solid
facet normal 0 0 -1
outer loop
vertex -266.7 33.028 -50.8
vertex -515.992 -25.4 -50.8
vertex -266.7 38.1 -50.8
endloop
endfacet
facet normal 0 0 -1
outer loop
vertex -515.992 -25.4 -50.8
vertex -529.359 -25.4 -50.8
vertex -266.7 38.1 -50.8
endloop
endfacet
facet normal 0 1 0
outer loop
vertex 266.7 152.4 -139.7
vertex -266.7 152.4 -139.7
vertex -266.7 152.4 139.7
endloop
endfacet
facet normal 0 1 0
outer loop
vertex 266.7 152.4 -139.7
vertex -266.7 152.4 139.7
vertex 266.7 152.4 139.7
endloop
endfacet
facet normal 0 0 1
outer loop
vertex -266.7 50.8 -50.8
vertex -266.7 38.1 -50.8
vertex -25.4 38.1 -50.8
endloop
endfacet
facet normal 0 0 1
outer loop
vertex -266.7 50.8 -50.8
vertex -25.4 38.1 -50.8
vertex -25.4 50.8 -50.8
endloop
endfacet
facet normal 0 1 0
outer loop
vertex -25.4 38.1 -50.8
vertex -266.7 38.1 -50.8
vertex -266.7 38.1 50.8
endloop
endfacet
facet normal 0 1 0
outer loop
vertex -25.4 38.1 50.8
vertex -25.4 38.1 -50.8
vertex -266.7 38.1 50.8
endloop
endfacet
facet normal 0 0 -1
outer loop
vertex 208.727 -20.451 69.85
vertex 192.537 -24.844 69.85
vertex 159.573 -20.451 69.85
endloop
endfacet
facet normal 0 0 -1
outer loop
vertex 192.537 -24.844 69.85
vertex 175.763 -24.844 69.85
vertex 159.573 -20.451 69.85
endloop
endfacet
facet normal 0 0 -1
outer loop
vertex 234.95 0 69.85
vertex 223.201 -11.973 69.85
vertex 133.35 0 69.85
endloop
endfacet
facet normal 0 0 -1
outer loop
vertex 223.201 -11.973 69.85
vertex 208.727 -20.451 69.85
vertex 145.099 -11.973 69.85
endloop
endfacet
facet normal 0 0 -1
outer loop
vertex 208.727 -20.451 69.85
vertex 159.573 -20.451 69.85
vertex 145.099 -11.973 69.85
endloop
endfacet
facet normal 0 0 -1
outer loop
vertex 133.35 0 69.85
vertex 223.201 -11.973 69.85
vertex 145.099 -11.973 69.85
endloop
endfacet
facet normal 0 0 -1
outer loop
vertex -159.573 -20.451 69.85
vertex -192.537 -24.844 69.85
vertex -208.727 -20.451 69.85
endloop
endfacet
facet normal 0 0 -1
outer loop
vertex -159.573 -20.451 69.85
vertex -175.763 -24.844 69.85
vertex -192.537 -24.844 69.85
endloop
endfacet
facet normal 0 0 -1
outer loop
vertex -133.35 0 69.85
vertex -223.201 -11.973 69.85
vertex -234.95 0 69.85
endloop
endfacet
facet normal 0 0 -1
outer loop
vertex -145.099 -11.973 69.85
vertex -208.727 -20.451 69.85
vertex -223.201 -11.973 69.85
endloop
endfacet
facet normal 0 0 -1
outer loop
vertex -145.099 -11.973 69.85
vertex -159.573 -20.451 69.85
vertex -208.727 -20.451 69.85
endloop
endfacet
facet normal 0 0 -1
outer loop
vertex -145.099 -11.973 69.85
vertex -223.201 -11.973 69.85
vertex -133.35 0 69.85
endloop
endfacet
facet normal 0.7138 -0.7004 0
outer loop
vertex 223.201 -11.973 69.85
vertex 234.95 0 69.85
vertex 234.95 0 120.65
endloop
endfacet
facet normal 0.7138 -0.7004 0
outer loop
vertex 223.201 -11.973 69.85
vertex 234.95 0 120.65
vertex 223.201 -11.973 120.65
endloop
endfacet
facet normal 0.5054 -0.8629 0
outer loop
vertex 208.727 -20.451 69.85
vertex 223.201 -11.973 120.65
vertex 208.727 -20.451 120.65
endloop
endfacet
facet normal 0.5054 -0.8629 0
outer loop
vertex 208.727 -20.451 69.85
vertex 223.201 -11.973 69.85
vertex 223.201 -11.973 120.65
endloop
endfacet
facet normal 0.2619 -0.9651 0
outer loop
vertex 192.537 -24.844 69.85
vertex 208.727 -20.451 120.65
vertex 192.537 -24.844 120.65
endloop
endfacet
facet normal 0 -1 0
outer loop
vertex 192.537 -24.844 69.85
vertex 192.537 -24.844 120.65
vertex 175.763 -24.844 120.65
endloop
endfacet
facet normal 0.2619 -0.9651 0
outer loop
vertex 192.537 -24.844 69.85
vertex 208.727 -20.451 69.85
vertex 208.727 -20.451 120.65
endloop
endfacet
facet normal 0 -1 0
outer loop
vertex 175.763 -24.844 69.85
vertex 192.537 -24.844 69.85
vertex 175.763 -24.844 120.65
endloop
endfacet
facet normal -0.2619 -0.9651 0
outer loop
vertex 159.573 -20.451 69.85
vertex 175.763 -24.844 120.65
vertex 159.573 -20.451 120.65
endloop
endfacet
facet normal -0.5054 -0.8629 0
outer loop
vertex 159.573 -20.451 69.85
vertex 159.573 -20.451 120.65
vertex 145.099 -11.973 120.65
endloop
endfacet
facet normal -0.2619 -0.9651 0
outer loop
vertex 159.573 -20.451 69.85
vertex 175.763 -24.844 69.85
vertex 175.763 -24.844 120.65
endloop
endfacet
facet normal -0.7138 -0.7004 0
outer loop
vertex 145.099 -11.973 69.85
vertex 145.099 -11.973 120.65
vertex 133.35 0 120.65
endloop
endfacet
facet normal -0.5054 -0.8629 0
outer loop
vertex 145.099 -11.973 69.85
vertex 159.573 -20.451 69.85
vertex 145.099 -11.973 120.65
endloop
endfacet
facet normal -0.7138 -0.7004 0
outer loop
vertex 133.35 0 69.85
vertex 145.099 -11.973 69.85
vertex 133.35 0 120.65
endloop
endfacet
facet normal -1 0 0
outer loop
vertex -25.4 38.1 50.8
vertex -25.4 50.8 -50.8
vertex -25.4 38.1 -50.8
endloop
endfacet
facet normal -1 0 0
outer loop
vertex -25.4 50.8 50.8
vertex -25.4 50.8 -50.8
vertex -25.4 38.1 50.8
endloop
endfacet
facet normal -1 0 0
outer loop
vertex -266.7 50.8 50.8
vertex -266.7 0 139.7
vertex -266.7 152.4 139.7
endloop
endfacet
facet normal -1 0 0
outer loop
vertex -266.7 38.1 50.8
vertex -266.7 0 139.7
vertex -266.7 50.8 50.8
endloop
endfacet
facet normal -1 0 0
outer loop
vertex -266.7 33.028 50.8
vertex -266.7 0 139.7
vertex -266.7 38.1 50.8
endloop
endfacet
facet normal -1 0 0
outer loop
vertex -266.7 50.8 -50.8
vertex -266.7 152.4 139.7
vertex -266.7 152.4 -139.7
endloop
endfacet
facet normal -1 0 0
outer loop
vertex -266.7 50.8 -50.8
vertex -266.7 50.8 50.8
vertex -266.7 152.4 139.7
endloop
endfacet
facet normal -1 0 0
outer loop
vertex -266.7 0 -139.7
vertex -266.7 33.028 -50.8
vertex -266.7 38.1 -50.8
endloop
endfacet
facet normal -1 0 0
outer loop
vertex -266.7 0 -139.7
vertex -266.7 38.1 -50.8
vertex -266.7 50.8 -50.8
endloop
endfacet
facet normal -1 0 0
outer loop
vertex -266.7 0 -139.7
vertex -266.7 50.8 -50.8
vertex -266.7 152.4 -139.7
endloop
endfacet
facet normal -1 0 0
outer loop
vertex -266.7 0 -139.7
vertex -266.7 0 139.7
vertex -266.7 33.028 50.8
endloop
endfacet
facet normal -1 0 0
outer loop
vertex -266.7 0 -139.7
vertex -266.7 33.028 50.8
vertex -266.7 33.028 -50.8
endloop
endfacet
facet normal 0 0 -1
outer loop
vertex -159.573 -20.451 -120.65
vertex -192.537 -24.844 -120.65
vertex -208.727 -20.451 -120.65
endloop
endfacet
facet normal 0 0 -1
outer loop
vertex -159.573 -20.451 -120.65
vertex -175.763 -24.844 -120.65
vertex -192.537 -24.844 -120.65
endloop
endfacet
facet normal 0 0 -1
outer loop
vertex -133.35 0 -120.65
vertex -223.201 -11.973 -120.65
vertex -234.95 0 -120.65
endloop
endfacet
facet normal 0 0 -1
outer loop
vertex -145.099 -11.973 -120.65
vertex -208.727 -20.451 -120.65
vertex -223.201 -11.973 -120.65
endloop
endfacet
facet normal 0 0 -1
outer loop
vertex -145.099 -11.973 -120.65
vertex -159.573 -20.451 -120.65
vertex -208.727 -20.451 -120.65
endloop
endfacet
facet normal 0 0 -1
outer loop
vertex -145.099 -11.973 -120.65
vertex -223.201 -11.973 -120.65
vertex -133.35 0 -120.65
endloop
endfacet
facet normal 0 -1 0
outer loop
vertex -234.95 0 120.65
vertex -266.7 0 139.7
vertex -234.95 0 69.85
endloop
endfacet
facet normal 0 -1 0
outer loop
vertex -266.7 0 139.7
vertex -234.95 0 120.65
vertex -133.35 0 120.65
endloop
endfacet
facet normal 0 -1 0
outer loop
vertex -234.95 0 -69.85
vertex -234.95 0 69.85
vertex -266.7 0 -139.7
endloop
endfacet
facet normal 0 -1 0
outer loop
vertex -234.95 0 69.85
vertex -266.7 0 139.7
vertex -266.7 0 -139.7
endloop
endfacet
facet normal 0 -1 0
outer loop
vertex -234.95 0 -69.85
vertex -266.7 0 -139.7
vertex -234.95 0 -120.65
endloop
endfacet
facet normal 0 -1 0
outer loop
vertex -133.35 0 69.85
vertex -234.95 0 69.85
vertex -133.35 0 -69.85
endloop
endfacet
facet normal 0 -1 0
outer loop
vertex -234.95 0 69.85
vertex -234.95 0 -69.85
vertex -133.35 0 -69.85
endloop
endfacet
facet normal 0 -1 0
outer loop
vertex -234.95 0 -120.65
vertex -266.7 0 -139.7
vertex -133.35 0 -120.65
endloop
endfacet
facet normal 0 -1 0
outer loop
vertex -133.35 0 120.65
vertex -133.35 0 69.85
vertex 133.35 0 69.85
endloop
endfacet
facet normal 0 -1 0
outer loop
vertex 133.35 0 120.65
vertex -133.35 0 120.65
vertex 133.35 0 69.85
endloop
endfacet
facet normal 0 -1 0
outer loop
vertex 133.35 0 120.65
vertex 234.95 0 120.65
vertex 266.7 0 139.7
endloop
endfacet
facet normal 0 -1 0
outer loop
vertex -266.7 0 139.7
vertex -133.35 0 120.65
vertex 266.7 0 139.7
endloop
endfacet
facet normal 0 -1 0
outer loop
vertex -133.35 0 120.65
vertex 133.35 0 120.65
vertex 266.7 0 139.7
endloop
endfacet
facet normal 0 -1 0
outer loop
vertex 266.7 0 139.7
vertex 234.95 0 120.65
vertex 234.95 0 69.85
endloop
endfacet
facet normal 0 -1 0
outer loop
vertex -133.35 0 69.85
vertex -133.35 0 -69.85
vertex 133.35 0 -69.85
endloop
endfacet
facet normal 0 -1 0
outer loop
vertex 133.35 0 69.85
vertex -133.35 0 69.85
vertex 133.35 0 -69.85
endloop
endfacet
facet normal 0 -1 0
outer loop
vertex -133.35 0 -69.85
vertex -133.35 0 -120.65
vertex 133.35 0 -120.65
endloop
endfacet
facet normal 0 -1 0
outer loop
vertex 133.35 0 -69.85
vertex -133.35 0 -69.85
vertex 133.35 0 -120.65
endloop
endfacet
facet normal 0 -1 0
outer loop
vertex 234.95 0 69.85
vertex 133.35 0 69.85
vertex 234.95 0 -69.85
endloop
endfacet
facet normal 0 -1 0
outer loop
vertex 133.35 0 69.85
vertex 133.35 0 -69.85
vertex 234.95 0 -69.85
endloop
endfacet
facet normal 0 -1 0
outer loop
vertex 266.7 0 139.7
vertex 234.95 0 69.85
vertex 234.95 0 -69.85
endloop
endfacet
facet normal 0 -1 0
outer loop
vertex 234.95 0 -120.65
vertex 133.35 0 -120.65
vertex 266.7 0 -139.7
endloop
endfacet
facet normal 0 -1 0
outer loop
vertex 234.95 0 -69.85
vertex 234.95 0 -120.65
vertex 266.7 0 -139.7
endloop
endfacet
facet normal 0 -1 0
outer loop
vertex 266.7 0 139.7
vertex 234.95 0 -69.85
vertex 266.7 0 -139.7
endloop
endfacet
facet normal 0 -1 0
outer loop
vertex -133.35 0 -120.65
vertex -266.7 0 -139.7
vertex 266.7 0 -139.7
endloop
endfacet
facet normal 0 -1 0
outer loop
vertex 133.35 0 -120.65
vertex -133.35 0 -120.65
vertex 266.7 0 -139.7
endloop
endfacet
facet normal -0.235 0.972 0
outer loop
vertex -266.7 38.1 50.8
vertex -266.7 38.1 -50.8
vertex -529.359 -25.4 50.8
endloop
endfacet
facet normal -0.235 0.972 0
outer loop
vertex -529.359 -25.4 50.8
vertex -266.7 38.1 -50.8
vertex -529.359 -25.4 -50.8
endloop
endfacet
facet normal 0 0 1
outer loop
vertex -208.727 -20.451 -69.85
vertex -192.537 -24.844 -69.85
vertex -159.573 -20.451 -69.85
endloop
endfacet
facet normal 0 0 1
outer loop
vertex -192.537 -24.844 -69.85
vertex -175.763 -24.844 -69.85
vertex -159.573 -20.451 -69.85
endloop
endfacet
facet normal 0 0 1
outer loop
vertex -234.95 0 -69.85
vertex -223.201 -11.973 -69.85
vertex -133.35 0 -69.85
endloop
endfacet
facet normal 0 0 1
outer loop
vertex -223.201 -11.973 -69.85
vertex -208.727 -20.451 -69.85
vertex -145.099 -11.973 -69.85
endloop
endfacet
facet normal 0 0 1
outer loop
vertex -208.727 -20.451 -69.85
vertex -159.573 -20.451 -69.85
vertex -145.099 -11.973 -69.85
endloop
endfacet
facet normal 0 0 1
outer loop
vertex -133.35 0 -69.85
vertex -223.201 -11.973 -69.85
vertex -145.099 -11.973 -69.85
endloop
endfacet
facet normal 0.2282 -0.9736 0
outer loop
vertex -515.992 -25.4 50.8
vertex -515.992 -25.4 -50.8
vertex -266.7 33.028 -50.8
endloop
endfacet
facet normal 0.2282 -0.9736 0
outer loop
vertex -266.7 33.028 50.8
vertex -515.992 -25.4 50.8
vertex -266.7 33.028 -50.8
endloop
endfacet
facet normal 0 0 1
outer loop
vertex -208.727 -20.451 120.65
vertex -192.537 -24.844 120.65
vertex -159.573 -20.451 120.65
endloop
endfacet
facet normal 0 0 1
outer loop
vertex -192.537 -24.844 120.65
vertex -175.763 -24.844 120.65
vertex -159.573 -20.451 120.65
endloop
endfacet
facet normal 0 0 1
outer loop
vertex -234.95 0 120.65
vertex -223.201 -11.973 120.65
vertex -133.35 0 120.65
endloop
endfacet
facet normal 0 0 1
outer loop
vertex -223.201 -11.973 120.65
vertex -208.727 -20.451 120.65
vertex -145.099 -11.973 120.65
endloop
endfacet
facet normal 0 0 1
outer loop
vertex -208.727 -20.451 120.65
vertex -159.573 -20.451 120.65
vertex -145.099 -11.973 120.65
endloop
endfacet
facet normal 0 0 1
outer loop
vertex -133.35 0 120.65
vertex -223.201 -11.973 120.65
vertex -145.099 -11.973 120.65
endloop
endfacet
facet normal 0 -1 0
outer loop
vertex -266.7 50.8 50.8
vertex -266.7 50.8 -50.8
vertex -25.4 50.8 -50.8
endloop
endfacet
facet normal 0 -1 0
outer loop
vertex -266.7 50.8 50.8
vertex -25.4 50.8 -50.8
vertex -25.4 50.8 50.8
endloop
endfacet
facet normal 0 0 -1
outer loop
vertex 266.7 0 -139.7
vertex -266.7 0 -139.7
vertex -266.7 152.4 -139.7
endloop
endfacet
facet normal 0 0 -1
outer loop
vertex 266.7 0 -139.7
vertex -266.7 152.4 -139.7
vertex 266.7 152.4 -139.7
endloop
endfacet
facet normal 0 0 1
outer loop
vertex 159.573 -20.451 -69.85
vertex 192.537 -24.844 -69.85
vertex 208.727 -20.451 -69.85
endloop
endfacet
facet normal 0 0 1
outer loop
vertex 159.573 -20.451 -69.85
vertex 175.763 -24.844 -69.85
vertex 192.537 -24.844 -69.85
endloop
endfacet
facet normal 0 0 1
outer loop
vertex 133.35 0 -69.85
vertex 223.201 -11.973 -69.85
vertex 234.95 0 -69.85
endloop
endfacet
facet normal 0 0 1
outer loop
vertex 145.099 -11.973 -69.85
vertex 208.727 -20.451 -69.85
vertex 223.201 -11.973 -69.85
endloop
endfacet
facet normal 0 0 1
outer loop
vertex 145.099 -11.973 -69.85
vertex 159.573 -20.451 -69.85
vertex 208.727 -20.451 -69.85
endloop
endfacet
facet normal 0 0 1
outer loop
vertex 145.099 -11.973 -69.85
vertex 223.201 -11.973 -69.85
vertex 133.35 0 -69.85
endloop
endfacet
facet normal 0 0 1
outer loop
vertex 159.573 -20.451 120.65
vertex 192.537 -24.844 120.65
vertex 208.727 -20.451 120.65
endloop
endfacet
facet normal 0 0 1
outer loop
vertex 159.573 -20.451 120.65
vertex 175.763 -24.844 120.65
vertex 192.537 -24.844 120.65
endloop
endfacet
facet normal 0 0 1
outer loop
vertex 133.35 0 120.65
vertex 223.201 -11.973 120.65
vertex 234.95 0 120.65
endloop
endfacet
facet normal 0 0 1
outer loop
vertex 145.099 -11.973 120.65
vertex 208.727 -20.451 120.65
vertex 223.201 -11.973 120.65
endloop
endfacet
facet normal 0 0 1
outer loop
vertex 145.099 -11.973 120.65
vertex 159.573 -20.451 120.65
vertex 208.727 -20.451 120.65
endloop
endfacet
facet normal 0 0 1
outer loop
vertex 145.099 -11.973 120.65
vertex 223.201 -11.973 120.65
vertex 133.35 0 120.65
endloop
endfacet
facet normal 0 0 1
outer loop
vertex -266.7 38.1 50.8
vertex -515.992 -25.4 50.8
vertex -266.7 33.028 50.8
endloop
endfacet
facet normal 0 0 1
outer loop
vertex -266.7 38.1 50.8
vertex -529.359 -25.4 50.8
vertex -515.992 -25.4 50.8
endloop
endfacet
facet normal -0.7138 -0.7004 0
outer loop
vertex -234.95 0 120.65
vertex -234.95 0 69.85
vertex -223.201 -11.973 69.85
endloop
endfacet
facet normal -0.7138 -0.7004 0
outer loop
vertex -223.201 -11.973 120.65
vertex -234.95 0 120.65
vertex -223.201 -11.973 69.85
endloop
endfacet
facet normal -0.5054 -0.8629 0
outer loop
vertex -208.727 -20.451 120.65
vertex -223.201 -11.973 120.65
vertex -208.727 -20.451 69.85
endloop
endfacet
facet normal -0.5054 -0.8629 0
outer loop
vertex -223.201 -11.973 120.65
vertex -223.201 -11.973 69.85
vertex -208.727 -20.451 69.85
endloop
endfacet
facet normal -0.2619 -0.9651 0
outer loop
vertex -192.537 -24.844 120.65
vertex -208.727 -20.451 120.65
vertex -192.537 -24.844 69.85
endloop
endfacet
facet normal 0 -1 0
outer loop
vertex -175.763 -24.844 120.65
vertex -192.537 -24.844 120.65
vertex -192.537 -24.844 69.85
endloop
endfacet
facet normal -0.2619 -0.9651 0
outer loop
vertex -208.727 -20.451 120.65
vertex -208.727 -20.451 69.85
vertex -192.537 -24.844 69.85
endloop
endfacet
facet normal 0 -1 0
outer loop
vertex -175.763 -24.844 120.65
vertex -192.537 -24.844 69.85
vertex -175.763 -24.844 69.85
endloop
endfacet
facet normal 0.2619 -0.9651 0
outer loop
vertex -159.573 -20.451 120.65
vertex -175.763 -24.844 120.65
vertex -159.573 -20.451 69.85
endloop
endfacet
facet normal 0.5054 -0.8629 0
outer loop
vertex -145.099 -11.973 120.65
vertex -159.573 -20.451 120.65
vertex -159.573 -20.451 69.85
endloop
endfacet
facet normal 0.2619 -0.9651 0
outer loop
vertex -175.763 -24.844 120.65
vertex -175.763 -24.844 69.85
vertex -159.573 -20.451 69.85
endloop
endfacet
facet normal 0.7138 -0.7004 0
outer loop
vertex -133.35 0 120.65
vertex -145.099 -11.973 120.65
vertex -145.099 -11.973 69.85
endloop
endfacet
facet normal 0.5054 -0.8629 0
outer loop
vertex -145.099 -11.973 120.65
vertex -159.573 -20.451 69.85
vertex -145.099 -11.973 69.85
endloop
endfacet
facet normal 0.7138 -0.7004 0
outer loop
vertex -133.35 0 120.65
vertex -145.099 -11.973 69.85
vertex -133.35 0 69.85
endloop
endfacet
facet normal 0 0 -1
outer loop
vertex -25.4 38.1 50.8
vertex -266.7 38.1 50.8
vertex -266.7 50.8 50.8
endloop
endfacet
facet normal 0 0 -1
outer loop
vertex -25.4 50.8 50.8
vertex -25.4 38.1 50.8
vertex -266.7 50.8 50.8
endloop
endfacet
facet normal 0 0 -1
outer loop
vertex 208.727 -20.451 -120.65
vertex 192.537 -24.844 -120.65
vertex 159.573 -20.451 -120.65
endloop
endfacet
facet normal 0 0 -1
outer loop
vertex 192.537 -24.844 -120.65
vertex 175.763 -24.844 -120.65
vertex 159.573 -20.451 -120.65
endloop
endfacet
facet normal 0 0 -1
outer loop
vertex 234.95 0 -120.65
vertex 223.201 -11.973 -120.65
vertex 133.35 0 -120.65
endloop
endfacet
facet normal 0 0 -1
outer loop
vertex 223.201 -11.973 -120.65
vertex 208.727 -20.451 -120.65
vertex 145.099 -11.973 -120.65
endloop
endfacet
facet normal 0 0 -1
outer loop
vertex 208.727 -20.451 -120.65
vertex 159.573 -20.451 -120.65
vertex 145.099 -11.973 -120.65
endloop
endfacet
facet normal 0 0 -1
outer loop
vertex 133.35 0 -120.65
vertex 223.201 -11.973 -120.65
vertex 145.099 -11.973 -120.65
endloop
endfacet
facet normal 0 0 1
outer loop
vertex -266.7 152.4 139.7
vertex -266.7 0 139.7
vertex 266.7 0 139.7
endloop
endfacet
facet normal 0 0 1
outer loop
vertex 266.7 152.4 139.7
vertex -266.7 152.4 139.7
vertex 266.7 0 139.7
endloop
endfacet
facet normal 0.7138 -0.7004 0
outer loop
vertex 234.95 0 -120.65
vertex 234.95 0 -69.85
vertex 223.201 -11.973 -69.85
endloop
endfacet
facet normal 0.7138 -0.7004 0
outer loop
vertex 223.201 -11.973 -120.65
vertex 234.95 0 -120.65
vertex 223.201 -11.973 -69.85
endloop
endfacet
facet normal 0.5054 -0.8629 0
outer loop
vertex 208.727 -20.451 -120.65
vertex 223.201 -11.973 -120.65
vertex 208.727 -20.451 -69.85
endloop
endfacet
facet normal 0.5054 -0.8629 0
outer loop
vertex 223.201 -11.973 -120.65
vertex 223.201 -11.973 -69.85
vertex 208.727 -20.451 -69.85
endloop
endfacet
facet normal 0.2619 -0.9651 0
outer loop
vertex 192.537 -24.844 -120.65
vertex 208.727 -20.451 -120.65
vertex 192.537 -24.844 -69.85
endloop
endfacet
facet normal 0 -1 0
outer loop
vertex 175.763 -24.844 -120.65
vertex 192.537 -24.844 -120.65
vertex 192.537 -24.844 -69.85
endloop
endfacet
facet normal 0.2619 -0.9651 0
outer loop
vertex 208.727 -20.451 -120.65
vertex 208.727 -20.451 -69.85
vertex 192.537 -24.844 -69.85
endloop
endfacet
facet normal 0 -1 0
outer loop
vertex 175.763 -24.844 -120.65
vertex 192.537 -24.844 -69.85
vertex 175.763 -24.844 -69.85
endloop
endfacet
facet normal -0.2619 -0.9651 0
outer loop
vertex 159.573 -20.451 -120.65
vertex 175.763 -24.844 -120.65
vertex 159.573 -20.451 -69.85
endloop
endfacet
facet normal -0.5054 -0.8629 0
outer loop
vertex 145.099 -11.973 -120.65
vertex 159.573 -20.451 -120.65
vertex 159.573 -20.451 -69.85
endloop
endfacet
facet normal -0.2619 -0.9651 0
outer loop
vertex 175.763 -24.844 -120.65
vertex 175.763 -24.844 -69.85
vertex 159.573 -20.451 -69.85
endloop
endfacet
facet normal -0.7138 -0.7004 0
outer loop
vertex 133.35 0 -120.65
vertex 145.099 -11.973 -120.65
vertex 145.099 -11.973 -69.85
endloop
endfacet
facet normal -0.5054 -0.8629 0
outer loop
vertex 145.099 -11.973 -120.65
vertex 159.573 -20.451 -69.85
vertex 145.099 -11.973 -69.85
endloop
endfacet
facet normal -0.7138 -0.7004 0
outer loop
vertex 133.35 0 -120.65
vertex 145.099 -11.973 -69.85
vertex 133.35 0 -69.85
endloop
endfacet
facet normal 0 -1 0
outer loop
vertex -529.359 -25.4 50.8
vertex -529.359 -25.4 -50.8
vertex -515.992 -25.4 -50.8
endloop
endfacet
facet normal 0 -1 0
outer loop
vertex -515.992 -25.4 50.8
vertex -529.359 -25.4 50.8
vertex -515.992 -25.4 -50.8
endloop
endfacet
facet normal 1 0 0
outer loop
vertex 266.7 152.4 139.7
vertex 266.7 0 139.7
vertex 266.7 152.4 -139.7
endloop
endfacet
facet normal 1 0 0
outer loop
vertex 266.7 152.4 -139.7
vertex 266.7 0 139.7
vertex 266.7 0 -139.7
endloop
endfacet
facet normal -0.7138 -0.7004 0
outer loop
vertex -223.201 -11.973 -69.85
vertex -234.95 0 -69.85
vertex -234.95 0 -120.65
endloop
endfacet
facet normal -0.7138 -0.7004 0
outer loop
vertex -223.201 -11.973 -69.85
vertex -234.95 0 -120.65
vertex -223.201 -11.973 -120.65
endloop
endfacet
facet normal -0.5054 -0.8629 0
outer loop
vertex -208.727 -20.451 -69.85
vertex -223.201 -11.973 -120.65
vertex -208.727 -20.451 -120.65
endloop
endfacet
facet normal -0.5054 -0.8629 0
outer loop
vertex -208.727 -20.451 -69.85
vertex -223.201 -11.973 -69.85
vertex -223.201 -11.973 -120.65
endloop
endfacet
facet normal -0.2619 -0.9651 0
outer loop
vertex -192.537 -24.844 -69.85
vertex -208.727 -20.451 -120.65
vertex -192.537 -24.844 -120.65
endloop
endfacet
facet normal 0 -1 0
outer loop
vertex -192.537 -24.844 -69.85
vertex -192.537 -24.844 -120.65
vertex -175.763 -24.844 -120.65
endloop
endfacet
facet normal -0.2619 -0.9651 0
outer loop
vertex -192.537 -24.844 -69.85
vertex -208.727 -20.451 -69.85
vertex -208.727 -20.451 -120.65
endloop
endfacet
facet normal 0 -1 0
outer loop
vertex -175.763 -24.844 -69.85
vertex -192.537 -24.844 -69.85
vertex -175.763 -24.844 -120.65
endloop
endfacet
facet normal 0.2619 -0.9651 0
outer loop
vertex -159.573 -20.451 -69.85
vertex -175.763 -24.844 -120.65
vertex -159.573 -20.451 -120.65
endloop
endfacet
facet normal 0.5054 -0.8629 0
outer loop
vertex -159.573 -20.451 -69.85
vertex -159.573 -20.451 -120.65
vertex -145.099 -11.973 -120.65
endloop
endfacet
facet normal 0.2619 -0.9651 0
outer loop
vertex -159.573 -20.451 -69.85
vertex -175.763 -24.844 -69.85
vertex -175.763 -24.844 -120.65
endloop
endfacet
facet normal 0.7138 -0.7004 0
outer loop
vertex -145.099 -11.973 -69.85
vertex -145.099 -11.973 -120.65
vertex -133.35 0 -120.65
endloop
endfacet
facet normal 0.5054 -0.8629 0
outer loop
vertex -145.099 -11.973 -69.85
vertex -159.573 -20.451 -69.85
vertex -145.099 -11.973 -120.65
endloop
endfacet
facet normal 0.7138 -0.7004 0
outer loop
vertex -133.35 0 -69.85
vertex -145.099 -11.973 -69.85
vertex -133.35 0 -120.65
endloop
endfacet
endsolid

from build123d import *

# Parameters (mm, degrees)
CHASIS_W                = 533.4
CHASIS_H                = 279.4
BOSS_EXTRUDE1_DEPTH     = 152.4
SKETCH3_W               = 63.5
SKETCH3_H               = 50.8
MIRROR2_COPY_1_SKETCH_W = 63.5
MIRROR2_COPY_1_SKETCH_H = 50.8
SKETCH4_W               = 101.6
SKETCH4_H               = 12.7
CUT_EXTRUDE1_DEPTH      = 241.3
BOSS_EXTRUDE2_DEPTH     = 101.6


with BuildPart() as part:
    # Chasis → Boss-Extrude1 (new body)
    with BuildSketch(Plane(origin=(0, 0, 0), x_dir=(1, 0, 0), z_dir=(0, 1, 0))):
        Rectangle(CHASIS_W, CHASIS_H)
    extrude(amount=BOSS_EXTRUDE1_DEPTH)

    # Sketch3 → Revolve2 (revolve)
    with BuildSketch(Plane(origin=(0, 38.1, 0), x_dir=(-1, 0, 0), z_dir=(0, -1, 0))):
        with Locations((215.9, -95.25)):
            Rectangle(SKETCH3_W, SKETCH3_H)
    revolve2 = revolve(axis=Axis((-184.15, 38.1, 69.85), (0, 0, 1)))

    # Mirror1: Revolve2 across plane
    add(revolve2.mirror(Plane.XY))

    # Mirror2: Revolve2 across plane
    add(revolve2.mirror(Plane(origin=(0, 0, 0), x_dir=(0, 0, 1), z_dir=(1, 0, 0))))

    # Mirror2 copy 1 sketch → Mirror2 copy 1 (revolve)
    with BuildSketch(Plane.XZ.offset(-38.1)):
        with Locations((215.9, -95.25)):
            Rectangle(MIRROR2_COPY_1_SKETCH_W, MIRROR2_COPY_1_SKETCH_H)
    revolve(axis=Axis((184.15, 38.1, -69.85), (0, 0, -1)))

    # Sketch4 → Cut-Extrude1 (cut)
    with BuildSketch(Plane.ZY.offset(266.7)):
        with Locations((0, 44.45)):
            Rectangle(SKETCH4_W, SKETCH4_H)
    extrude(amount=-CUT_EXTRUDE1_DEPTH, mode=Mode.SUBTRACT)

    # Sketch7 → Boss-Extrude2 (add)
    with BuildSketch(Plane.XY.offset(-50.8)):
        Polygon((-266.7, 38.1), (-529.359422098, -25.4), (-515.991575795, -25.4), (-266.7, 33.027558643), align=None)
    extrude(amount=BOSS_EXTRUDE2_DEPTH)


solid = part.part
